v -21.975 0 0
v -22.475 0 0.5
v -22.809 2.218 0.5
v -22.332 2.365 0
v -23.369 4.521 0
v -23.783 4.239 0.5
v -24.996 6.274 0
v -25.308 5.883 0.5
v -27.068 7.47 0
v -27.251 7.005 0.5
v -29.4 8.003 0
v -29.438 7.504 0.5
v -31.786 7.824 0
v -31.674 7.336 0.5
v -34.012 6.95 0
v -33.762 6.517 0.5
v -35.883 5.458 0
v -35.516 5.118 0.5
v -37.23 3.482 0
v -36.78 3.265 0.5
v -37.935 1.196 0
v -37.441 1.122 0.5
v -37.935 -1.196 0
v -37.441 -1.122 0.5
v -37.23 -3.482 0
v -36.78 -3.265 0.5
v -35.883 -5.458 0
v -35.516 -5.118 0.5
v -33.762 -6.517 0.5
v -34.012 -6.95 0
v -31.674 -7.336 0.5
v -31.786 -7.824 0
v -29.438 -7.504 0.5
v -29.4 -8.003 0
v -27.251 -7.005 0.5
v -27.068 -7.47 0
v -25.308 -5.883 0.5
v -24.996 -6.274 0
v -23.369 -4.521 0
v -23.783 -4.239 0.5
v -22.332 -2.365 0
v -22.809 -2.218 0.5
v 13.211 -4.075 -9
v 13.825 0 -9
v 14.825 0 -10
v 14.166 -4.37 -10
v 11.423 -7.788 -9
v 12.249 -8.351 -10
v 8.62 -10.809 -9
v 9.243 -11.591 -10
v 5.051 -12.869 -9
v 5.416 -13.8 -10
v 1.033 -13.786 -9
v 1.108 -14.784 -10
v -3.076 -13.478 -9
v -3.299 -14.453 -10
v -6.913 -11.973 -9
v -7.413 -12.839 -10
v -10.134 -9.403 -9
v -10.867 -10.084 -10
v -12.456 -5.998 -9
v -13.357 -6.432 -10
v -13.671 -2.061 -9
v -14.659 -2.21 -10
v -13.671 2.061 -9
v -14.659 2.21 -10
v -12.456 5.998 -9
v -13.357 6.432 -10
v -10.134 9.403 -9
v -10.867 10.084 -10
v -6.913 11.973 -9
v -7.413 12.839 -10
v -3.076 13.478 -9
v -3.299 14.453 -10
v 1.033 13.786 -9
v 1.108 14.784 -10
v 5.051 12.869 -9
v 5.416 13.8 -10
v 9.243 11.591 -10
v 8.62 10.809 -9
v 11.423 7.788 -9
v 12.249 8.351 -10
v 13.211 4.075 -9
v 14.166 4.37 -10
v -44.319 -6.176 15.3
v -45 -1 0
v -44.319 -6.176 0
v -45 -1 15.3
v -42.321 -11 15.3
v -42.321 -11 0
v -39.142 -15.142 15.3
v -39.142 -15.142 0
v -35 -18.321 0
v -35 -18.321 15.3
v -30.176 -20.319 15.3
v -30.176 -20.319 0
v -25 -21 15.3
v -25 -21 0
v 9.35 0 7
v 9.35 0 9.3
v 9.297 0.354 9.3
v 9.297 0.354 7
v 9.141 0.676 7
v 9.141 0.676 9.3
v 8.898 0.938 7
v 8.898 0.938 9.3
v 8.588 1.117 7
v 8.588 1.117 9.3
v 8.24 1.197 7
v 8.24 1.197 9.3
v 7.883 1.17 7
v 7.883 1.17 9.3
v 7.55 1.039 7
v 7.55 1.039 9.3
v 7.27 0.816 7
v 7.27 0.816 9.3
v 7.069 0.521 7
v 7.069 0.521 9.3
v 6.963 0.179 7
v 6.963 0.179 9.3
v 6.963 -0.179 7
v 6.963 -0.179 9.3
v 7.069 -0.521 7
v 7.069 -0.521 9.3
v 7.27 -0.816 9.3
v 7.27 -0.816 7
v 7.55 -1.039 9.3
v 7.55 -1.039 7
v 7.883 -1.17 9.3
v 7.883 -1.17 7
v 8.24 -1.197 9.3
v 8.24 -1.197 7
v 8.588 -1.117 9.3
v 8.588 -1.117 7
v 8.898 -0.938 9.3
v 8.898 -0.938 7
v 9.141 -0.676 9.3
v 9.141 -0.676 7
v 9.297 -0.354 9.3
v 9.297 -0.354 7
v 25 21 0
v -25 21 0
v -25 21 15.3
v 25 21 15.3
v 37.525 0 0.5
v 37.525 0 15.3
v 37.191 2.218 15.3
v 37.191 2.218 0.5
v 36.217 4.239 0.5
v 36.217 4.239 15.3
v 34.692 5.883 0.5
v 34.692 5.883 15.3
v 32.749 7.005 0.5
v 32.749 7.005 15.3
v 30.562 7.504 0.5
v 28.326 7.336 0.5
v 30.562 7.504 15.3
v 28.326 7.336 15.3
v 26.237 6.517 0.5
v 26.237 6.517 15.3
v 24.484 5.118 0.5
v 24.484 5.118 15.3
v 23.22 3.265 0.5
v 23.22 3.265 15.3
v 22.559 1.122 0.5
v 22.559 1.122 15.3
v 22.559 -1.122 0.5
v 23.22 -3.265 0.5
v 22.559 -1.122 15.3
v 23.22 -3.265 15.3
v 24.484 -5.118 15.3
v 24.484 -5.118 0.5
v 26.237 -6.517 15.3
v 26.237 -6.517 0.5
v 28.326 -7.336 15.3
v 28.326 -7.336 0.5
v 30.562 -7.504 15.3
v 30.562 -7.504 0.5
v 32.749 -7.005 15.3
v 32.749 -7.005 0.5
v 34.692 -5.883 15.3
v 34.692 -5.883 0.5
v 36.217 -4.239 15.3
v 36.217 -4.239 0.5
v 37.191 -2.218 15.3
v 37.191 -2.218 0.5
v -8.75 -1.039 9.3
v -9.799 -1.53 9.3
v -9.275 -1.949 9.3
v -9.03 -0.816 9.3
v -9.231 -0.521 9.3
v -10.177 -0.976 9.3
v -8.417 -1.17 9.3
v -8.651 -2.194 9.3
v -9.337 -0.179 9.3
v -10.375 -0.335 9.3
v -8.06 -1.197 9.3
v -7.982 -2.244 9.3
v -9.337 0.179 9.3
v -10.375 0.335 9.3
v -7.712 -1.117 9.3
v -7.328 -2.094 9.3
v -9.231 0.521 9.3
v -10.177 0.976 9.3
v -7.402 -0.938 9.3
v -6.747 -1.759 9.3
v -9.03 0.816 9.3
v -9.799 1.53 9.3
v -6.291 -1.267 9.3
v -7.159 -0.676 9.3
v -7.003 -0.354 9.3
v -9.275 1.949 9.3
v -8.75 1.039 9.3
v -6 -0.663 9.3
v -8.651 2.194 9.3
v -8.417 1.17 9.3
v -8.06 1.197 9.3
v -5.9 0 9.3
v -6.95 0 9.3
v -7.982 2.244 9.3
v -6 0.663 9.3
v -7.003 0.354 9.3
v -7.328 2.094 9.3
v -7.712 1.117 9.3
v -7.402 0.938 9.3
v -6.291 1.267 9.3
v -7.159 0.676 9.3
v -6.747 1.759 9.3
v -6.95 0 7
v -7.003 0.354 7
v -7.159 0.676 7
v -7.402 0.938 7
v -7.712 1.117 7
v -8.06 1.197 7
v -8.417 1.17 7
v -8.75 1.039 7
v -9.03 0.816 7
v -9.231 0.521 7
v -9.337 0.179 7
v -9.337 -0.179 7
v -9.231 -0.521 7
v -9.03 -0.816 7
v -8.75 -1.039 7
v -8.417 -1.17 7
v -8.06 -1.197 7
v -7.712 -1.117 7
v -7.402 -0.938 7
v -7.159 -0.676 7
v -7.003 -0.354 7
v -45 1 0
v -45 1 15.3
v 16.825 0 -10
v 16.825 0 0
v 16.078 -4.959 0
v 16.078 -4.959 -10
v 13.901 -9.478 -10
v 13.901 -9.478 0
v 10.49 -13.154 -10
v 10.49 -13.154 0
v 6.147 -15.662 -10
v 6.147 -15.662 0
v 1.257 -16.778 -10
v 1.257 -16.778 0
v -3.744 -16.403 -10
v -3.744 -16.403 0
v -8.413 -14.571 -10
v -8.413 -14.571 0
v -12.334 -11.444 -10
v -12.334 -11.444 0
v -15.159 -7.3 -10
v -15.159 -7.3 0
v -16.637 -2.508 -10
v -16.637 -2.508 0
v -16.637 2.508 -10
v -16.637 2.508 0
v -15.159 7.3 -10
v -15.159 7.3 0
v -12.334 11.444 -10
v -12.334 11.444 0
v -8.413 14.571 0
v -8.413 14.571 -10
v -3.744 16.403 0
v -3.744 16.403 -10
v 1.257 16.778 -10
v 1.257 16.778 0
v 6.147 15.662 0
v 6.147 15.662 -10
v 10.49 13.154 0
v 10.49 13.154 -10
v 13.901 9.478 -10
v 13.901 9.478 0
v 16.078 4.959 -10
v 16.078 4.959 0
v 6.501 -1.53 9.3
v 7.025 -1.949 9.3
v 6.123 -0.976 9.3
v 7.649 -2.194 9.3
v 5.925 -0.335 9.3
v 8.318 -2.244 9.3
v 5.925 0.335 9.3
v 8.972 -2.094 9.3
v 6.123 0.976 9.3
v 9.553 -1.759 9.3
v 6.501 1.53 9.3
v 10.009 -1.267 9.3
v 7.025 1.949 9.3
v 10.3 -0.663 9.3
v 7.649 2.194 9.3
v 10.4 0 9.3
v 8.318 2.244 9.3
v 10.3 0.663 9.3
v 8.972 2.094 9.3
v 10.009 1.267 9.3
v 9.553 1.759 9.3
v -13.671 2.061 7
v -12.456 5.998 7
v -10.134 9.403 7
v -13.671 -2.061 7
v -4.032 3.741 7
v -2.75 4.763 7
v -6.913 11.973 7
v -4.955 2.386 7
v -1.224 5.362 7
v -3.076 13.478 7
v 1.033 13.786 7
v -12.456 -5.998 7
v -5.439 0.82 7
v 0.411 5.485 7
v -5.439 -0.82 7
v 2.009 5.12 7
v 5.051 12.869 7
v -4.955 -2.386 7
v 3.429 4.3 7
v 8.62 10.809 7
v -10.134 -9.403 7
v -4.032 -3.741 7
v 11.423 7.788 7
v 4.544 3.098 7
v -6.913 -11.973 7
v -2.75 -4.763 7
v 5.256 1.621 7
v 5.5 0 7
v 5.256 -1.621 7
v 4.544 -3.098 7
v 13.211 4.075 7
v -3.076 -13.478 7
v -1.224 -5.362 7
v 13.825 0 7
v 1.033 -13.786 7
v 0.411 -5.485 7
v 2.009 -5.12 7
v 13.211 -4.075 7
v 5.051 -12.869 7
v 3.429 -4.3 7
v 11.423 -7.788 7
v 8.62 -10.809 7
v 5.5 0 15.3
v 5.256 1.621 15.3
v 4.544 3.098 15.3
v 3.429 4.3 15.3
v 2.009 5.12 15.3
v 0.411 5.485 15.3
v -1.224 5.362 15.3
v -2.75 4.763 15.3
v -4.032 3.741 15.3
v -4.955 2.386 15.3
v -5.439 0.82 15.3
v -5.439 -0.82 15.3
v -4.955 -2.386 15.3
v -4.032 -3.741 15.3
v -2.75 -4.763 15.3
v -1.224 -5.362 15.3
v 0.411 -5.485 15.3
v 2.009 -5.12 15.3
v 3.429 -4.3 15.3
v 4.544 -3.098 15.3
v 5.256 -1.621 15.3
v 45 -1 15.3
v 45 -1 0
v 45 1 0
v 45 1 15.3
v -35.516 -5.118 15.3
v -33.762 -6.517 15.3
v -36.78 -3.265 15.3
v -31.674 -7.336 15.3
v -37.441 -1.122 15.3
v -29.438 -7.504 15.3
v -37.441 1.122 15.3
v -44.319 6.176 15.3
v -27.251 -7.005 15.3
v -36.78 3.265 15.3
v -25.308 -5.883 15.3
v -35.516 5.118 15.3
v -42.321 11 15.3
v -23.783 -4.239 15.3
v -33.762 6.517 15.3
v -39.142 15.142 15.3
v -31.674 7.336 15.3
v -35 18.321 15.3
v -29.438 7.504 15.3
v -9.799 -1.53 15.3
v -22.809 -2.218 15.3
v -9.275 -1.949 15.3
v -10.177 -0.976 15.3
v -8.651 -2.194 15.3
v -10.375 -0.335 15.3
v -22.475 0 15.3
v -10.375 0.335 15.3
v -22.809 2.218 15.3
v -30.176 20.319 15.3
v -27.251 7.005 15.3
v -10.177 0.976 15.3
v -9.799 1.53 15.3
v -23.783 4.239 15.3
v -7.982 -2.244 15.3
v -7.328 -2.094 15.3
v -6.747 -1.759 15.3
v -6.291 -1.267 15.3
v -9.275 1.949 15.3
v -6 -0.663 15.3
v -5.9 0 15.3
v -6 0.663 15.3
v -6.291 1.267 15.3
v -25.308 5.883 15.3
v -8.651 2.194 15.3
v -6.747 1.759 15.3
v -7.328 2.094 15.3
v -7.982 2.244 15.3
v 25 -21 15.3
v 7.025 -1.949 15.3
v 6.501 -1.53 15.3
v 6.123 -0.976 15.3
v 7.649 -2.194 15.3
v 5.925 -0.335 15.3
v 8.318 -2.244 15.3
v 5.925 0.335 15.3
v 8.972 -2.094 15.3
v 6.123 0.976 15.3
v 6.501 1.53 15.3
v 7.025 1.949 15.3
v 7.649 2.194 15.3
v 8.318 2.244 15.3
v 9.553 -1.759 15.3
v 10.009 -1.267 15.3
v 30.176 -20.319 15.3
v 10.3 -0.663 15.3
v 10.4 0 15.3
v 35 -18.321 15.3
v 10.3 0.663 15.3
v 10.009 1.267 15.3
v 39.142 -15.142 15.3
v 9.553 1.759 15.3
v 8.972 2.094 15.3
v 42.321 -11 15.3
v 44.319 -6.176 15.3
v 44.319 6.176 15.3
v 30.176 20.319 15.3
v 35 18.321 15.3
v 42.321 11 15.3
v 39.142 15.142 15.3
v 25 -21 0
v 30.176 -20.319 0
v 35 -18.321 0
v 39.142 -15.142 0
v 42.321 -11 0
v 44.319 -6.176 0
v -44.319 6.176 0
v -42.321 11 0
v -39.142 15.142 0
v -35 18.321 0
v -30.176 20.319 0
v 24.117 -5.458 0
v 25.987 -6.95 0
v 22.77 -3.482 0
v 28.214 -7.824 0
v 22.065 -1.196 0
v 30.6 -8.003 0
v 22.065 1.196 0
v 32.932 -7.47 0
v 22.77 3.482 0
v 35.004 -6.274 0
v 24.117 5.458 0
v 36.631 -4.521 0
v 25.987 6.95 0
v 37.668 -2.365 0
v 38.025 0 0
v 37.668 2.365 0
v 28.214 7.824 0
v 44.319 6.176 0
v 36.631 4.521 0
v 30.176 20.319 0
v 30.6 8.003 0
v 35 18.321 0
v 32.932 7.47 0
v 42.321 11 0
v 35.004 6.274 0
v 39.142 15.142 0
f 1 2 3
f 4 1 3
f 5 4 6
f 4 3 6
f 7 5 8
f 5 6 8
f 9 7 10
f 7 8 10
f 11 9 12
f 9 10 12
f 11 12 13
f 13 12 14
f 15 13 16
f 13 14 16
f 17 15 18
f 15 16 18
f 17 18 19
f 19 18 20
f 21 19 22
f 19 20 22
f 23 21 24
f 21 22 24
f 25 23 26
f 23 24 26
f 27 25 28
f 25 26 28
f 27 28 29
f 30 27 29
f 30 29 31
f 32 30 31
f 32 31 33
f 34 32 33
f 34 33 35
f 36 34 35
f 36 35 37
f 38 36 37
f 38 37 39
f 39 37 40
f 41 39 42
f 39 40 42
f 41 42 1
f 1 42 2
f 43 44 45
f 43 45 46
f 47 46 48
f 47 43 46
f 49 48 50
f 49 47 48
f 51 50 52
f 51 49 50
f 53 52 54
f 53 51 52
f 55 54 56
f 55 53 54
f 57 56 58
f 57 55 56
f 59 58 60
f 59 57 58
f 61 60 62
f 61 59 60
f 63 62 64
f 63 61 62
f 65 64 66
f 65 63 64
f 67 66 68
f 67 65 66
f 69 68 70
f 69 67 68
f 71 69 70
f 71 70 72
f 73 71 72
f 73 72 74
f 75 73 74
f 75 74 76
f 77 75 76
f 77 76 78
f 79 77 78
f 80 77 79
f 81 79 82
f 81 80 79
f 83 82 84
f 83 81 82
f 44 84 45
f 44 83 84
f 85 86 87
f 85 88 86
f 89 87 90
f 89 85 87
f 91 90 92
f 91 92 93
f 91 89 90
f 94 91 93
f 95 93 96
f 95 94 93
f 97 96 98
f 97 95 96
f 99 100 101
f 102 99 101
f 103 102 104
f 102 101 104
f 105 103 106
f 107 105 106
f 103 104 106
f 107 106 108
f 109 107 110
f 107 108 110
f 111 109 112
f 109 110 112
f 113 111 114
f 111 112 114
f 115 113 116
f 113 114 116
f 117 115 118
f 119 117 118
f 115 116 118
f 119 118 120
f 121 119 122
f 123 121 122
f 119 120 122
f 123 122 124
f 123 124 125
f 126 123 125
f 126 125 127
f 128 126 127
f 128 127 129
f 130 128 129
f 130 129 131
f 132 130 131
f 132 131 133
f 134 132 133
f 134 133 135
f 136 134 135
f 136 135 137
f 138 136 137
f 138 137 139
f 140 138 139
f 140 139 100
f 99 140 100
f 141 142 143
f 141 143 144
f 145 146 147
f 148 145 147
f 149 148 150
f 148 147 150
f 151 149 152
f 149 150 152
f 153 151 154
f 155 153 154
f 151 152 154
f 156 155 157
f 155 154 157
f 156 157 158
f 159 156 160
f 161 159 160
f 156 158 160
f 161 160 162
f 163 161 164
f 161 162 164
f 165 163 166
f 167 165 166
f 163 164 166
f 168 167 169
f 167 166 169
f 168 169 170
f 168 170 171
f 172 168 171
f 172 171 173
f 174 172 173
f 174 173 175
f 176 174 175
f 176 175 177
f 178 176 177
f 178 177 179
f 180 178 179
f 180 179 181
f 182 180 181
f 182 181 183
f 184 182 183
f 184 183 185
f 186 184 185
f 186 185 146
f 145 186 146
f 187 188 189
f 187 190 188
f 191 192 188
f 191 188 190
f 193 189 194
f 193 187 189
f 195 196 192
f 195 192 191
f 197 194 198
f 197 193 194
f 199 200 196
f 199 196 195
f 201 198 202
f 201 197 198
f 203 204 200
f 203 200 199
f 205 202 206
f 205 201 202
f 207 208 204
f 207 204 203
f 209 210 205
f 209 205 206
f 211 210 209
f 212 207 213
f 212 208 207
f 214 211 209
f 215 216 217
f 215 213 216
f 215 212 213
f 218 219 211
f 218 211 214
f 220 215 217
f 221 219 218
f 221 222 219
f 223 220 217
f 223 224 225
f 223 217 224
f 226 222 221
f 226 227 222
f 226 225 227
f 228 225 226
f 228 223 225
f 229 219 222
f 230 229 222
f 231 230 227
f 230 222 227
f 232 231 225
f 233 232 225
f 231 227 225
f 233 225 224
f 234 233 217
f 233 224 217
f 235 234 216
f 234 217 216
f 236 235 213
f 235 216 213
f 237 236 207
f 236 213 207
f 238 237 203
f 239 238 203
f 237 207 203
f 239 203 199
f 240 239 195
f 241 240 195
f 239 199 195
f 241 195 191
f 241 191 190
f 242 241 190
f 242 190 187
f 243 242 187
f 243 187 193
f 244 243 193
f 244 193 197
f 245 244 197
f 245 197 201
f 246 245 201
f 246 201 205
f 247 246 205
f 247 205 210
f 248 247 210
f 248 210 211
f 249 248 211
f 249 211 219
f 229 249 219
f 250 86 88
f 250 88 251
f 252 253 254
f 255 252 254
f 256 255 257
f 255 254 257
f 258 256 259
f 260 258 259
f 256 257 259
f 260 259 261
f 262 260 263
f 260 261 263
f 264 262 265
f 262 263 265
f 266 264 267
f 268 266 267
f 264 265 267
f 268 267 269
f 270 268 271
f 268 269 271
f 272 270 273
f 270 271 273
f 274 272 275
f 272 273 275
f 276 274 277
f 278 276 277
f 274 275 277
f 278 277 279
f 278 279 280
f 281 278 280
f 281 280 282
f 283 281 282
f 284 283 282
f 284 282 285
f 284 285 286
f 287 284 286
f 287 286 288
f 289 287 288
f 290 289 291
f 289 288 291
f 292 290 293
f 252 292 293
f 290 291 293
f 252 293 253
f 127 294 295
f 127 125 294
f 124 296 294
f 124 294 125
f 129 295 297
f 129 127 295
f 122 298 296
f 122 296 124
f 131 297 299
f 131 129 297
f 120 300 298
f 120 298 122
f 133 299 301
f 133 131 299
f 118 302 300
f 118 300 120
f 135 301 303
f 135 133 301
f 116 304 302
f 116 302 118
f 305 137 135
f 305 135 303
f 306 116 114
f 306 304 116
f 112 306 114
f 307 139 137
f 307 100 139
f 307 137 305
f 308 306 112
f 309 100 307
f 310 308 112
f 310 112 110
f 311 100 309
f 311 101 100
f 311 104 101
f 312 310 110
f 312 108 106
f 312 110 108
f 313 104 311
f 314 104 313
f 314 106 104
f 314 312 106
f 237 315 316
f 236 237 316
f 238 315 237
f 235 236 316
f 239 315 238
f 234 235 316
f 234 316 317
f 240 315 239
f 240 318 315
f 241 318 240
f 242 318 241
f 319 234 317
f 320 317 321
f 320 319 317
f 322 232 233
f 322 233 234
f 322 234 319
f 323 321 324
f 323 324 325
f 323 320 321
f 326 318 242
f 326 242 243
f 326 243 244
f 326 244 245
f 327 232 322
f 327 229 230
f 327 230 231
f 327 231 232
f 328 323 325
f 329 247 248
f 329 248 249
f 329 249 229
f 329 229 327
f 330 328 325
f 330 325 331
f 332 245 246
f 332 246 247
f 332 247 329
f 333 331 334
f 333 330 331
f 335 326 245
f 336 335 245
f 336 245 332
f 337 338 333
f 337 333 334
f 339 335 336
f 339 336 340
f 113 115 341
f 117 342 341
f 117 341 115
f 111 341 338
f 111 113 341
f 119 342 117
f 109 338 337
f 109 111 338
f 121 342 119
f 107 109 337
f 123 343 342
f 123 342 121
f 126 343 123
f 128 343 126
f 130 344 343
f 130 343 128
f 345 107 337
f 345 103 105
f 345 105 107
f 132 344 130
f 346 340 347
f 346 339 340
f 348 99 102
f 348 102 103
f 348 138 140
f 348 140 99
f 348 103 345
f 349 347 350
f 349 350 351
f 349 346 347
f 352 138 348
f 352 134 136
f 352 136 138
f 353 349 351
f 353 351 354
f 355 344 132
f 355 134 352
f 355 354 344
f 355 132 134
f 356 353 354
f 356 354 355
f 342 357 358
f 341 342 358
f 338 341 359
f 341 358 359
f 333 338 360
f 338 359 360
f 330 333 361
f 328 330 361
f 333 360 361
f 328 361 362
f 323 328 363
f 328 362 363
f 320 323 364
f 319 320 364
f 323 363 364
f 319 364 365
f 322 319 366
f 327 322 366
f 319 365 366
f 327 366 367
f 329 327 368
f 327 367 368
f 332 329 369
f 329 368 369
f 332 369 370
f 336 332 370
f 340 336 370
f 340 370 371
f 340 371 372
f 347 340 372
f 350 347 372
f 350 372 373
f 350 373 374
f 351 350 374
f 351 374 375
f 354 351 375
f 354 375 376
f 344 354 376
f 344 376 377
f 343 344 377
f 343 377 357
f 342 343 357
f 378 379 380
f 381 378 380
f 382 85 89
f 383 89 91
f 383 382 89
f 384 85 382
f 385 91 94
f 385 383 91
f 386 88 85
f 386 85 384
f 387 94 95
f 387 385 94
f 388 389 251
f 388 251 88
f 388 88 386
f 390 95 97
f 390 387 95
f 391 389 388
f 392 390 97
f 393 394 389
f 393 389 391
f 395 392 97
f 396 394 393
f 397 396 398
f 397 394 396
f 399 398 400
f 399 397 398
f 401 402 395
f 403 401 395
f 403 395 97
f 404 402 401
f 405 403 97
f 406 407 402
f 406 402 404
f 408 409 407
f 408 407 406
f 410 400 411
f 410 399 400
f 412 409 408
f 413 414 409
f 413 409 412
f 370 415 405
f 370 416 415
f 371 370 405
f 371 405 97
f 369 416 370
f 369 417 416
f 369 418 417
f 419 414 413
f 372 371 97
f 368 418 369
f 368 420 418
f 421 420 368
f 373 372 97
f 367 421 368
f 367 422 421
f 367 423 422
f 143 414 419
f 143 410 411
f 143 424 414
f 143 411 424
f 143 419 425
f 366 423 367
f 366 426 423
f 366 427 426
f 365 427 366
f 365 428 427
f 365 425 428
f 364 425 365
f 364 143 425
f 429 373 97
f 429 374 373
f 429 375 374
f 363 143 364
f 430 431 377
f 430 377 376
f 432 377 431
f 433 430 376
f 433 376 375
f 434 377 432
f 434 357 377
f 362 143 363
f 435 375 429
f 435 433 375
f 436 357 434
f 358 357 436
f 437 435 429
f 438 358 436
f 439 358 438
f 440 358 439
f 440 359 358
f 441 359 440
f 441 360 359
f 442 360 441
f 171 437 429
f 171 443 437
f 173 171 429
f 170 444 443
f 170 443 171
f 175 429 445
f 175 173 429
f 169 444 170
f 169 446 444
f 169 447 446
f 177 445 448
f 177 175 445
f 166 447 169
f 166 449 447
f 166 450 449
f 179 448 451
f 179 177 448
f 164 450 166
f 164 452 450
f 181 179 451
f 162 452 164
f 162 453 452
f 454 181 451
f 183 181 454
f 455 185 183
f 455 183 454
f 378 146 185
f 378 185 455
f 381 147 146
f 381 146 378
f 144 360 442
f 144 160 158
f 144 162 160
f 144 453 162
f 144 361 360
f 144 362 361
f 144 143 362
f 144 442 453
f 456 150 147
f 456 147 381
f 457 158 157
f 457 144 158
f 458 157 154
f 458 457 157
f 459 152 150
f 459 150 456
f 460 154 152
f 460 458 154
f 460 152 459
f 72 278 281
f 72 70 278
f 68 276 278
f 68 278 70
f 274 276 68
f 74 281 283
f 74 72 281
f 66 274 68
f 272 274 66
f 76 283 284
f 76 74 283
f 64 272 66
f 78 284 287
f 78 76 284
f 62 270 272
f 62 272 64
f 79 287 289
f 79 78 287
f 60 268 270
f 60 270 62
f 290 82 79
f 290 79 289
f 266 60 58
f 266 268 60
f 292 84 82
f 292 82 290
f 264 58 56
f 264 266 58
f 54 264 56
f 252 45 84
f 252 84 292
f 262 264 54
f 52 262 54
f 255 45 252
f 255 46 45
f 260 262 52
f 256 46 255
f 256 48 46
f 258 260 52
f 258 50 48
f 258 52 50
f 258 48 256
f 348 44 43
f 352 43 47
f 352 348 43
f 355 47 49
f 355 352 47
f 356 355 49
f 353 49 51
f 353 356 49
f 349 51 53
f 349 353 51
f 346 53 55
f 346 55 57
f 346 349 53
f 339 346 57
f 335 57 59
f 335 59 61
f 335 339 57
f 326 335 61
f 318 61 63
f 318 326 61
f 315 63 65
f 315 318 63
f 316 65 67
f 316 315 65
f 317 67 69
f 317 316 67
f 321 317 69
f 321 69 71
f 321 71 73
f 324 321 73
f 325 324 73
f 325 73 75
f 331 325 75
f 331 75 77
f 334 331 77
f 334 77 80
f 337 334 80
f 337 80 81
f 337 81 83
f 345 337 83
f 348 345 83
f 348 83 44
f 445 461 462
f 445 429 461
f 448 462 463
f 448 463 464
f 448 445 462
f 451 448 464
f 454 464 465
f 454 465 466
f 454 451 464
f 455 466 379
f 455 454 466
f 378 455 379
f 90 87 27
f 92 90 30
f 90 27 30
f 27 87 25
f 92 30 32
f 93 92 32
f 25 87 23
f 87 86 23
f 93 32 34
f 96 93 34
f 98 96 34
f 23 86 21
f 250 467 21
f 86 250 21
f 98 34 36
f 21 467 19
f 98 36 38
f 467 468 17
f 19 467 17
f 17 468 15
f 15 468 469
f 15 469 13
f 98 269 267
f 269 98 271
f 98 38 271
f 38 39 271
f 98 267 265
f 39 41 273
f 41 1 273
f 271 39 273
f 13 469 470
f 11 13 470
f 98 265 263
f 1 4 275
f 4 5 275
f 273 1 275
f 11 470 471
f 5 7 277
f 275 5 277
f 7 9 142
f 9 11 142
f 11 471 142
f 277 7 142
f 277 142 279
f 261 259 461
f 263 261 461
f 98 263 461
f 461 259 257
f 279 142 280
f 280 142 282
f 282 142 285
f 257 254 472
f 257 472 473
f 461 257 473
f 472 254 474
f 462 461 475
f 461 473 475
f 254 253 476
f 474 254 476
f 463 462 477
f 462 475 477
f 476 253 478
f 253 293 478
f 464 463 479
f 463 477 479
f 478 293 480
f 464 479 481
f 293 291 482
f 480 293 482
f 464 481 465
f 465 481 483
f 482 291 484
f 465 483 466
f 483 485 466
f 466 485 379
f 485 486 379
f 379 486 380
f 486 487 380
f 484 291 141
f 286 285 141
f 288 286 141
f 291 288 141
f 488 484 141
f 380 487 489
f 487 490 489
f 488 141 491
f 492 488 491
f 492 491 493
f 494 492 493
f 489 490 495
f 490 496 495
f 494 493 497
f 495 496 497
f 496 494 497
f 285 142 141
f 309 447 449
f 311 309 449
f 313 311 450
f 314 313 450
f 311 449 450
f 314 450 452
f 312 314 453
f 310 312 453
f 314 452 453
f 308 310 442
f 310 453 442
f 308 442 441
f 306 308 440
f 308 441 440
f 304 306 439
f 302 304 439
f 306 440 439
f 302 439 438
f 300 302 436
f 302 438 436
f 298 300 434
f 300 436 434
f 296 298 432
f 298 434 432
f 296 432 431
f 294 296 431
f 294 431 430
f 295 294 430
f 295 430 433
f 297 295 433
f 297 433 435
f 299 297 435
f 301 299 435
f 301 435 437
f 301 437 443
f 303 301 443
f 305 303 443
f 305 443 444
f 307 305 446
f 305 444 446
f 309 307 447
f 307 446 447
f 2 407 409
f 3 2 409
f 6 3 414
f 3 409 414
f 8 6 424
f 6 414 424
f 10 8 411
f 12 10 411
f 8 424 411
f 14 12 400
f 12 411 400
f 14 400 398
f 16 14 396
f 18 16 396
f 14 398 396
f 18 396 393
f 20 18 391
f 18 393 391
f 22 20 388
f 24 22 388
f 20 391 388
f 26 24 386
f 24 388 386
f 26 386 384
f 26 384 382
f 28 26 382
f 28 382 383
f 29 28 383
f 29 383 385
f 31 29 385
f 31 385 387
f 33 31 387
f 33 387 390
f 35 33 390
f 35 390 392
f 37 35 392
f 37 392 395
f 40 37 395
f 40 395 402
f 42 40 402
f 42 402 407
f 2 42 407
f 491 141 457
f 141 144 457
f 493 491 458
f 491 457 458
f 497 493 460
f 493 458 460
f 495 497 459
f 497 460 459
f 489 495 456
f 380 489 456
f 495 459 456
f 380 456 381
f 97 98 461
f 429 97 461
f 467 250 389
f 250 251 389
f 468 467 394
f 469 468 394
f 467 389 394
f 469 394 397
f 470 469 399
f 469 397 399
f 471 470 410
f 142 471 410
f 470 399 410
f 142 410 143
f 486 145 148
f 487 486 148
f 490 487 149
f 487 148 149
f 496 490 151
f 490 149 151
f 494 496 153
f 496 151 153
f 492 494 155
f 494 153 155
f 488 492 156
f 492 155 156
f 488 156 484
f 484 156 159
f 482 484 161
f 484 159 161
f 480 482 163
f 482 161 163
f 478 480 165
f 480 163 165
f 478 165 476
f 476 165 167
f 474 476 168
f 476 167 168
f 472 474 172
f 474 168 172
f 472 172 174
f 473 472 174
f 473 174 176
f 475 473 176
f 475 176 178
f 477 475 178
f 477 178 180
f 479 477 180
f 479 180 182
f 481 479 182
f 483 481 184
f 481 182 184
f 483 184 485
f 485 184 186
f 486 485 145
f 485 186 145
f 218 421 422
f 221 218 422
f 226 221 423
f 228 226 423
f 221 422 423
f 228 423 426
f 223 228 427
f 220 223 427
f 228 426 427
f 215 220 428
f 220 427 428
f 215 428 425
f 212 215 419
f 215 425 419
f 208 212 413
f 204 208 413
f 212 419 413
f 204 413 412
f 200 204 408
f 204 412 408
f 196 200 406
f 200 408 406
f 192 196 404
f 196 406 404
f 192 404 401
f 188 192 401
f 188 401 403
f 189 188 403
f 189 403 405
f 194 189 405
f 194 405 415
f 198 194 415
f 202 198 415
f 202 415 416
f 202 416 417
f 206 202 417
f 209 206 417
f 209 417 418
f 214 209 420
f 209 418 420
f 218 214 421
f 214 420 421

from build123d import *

# Parameters (mm, degrees)
F0_W      = 90
F0_H      = 42
F1_DEPTH  = 15.3
F2_R      = 20
F3_R      = 20
F4_R      = 13.825
F5_DEPTH  = 7
F6_R      = 5.5
F7_DEPTH  = 10
F8_R      = 7.525
F8_R_2    = 1.2
F9_DEPTH  = 18
F10_R     = 16.825
F10_R_2   = 13.825
F11_DEPTH = 10
F12_SIZE  = 1
F13_SIZE  = 0.5
F14_R     = 2.25
F15_DEPTH = 6


with BuildPart() as f1:
    # F0 (on Top) → F1 (new body)
    with BuildSketch(Plane.XY):
        Rectangle(F0_W, F0_H)
    extrude(amount=F1_DEPTH)

    # F2
    f2_edges = [f1.edges().sort_by_distance(p)[0] for p in [
        (-45, -21, 7.65),
        (-45, 21, 7.65),
    ]]
    fillet(f2_edges, radius=F2_R)

    # F3
    f3_edges = [f1.edges().sort_by_distance(p)[0] for p in [
        (45, 21, 7.65),
        (45, -21, 7.65),
    ]]
    fillet(f3_edges, radius=F3_R)

    # F4 (on face) → F5 (cut)
    with BuildSketch(Plane(origin=(0, 0, 0), x_dir=(1, 0, 0), z_dir=(0, 0, -1))):
        Circle(F4_R)
    extrude(amount=-F5_DEPTH, mode=Mode.SUBTRACT)

    # F6 (on face) → F7 (cut)
    with BuildSketch(Plane.XY.offset(15.3)):
        Circle(F6_R)
    extrude(amount=-F7_DEPTH, mode=Mode.SUBTRACT)

    # F8 (on face) → F9 (cut)
    with BuildSketch(Plane.XY.offset(15.3)):
        with Locations((-30, 0)):
            Circle(F8_R)
        with Locations((30, 0)):
            Circle(F8_R)
        with Locations((-8.15, 0)):
            Circle(F8_R_2)
        with Locations((8.15, 0)):
            Circle(F8_R_2)
    extrude(amount=-F9_DEPTH, mode=Mode.SUBTRACT)

    # F10 (on face) → F11 (join)
    with BuildSketch(Plane(origin=(0, 0, 0), x_dir=(1, 0, 0), z_dir=(0, 0, -1))):
        Circle(F10_R)
        Circle(F10_R_2, mode=Mode.SUBTRACT)
    extrude(amount=F11_DEPTH)

    # F12
    f12_edges = [f1.edges().sort_by_distance(p)[0] for p in [
        (-13.825, 0, -10),
    ]]
    chamfer(f12_edges, length=F12_SIZE)

    # F13
    f13_edges = [f1.edges().sort_by_distance(p)[0] for p in [
        (-37.525, 0, 0),
        (22.475, 0, 0),
    ]]
    chamfer(f13_edges, length=F13_SIZE)

    # F14 (on face) → F15 (cut)
    with BuildSketch(Plane.XY.offset(15.3)):
        with Locations((-8.15, 0)):
            Circle(F14_R)
        with Locations((8.15, 0)):
            Circle(F14_R)
    extrude(amount=-F15_DEPTH, mode=Mode.SUBTRACT)


solid = f1.part
